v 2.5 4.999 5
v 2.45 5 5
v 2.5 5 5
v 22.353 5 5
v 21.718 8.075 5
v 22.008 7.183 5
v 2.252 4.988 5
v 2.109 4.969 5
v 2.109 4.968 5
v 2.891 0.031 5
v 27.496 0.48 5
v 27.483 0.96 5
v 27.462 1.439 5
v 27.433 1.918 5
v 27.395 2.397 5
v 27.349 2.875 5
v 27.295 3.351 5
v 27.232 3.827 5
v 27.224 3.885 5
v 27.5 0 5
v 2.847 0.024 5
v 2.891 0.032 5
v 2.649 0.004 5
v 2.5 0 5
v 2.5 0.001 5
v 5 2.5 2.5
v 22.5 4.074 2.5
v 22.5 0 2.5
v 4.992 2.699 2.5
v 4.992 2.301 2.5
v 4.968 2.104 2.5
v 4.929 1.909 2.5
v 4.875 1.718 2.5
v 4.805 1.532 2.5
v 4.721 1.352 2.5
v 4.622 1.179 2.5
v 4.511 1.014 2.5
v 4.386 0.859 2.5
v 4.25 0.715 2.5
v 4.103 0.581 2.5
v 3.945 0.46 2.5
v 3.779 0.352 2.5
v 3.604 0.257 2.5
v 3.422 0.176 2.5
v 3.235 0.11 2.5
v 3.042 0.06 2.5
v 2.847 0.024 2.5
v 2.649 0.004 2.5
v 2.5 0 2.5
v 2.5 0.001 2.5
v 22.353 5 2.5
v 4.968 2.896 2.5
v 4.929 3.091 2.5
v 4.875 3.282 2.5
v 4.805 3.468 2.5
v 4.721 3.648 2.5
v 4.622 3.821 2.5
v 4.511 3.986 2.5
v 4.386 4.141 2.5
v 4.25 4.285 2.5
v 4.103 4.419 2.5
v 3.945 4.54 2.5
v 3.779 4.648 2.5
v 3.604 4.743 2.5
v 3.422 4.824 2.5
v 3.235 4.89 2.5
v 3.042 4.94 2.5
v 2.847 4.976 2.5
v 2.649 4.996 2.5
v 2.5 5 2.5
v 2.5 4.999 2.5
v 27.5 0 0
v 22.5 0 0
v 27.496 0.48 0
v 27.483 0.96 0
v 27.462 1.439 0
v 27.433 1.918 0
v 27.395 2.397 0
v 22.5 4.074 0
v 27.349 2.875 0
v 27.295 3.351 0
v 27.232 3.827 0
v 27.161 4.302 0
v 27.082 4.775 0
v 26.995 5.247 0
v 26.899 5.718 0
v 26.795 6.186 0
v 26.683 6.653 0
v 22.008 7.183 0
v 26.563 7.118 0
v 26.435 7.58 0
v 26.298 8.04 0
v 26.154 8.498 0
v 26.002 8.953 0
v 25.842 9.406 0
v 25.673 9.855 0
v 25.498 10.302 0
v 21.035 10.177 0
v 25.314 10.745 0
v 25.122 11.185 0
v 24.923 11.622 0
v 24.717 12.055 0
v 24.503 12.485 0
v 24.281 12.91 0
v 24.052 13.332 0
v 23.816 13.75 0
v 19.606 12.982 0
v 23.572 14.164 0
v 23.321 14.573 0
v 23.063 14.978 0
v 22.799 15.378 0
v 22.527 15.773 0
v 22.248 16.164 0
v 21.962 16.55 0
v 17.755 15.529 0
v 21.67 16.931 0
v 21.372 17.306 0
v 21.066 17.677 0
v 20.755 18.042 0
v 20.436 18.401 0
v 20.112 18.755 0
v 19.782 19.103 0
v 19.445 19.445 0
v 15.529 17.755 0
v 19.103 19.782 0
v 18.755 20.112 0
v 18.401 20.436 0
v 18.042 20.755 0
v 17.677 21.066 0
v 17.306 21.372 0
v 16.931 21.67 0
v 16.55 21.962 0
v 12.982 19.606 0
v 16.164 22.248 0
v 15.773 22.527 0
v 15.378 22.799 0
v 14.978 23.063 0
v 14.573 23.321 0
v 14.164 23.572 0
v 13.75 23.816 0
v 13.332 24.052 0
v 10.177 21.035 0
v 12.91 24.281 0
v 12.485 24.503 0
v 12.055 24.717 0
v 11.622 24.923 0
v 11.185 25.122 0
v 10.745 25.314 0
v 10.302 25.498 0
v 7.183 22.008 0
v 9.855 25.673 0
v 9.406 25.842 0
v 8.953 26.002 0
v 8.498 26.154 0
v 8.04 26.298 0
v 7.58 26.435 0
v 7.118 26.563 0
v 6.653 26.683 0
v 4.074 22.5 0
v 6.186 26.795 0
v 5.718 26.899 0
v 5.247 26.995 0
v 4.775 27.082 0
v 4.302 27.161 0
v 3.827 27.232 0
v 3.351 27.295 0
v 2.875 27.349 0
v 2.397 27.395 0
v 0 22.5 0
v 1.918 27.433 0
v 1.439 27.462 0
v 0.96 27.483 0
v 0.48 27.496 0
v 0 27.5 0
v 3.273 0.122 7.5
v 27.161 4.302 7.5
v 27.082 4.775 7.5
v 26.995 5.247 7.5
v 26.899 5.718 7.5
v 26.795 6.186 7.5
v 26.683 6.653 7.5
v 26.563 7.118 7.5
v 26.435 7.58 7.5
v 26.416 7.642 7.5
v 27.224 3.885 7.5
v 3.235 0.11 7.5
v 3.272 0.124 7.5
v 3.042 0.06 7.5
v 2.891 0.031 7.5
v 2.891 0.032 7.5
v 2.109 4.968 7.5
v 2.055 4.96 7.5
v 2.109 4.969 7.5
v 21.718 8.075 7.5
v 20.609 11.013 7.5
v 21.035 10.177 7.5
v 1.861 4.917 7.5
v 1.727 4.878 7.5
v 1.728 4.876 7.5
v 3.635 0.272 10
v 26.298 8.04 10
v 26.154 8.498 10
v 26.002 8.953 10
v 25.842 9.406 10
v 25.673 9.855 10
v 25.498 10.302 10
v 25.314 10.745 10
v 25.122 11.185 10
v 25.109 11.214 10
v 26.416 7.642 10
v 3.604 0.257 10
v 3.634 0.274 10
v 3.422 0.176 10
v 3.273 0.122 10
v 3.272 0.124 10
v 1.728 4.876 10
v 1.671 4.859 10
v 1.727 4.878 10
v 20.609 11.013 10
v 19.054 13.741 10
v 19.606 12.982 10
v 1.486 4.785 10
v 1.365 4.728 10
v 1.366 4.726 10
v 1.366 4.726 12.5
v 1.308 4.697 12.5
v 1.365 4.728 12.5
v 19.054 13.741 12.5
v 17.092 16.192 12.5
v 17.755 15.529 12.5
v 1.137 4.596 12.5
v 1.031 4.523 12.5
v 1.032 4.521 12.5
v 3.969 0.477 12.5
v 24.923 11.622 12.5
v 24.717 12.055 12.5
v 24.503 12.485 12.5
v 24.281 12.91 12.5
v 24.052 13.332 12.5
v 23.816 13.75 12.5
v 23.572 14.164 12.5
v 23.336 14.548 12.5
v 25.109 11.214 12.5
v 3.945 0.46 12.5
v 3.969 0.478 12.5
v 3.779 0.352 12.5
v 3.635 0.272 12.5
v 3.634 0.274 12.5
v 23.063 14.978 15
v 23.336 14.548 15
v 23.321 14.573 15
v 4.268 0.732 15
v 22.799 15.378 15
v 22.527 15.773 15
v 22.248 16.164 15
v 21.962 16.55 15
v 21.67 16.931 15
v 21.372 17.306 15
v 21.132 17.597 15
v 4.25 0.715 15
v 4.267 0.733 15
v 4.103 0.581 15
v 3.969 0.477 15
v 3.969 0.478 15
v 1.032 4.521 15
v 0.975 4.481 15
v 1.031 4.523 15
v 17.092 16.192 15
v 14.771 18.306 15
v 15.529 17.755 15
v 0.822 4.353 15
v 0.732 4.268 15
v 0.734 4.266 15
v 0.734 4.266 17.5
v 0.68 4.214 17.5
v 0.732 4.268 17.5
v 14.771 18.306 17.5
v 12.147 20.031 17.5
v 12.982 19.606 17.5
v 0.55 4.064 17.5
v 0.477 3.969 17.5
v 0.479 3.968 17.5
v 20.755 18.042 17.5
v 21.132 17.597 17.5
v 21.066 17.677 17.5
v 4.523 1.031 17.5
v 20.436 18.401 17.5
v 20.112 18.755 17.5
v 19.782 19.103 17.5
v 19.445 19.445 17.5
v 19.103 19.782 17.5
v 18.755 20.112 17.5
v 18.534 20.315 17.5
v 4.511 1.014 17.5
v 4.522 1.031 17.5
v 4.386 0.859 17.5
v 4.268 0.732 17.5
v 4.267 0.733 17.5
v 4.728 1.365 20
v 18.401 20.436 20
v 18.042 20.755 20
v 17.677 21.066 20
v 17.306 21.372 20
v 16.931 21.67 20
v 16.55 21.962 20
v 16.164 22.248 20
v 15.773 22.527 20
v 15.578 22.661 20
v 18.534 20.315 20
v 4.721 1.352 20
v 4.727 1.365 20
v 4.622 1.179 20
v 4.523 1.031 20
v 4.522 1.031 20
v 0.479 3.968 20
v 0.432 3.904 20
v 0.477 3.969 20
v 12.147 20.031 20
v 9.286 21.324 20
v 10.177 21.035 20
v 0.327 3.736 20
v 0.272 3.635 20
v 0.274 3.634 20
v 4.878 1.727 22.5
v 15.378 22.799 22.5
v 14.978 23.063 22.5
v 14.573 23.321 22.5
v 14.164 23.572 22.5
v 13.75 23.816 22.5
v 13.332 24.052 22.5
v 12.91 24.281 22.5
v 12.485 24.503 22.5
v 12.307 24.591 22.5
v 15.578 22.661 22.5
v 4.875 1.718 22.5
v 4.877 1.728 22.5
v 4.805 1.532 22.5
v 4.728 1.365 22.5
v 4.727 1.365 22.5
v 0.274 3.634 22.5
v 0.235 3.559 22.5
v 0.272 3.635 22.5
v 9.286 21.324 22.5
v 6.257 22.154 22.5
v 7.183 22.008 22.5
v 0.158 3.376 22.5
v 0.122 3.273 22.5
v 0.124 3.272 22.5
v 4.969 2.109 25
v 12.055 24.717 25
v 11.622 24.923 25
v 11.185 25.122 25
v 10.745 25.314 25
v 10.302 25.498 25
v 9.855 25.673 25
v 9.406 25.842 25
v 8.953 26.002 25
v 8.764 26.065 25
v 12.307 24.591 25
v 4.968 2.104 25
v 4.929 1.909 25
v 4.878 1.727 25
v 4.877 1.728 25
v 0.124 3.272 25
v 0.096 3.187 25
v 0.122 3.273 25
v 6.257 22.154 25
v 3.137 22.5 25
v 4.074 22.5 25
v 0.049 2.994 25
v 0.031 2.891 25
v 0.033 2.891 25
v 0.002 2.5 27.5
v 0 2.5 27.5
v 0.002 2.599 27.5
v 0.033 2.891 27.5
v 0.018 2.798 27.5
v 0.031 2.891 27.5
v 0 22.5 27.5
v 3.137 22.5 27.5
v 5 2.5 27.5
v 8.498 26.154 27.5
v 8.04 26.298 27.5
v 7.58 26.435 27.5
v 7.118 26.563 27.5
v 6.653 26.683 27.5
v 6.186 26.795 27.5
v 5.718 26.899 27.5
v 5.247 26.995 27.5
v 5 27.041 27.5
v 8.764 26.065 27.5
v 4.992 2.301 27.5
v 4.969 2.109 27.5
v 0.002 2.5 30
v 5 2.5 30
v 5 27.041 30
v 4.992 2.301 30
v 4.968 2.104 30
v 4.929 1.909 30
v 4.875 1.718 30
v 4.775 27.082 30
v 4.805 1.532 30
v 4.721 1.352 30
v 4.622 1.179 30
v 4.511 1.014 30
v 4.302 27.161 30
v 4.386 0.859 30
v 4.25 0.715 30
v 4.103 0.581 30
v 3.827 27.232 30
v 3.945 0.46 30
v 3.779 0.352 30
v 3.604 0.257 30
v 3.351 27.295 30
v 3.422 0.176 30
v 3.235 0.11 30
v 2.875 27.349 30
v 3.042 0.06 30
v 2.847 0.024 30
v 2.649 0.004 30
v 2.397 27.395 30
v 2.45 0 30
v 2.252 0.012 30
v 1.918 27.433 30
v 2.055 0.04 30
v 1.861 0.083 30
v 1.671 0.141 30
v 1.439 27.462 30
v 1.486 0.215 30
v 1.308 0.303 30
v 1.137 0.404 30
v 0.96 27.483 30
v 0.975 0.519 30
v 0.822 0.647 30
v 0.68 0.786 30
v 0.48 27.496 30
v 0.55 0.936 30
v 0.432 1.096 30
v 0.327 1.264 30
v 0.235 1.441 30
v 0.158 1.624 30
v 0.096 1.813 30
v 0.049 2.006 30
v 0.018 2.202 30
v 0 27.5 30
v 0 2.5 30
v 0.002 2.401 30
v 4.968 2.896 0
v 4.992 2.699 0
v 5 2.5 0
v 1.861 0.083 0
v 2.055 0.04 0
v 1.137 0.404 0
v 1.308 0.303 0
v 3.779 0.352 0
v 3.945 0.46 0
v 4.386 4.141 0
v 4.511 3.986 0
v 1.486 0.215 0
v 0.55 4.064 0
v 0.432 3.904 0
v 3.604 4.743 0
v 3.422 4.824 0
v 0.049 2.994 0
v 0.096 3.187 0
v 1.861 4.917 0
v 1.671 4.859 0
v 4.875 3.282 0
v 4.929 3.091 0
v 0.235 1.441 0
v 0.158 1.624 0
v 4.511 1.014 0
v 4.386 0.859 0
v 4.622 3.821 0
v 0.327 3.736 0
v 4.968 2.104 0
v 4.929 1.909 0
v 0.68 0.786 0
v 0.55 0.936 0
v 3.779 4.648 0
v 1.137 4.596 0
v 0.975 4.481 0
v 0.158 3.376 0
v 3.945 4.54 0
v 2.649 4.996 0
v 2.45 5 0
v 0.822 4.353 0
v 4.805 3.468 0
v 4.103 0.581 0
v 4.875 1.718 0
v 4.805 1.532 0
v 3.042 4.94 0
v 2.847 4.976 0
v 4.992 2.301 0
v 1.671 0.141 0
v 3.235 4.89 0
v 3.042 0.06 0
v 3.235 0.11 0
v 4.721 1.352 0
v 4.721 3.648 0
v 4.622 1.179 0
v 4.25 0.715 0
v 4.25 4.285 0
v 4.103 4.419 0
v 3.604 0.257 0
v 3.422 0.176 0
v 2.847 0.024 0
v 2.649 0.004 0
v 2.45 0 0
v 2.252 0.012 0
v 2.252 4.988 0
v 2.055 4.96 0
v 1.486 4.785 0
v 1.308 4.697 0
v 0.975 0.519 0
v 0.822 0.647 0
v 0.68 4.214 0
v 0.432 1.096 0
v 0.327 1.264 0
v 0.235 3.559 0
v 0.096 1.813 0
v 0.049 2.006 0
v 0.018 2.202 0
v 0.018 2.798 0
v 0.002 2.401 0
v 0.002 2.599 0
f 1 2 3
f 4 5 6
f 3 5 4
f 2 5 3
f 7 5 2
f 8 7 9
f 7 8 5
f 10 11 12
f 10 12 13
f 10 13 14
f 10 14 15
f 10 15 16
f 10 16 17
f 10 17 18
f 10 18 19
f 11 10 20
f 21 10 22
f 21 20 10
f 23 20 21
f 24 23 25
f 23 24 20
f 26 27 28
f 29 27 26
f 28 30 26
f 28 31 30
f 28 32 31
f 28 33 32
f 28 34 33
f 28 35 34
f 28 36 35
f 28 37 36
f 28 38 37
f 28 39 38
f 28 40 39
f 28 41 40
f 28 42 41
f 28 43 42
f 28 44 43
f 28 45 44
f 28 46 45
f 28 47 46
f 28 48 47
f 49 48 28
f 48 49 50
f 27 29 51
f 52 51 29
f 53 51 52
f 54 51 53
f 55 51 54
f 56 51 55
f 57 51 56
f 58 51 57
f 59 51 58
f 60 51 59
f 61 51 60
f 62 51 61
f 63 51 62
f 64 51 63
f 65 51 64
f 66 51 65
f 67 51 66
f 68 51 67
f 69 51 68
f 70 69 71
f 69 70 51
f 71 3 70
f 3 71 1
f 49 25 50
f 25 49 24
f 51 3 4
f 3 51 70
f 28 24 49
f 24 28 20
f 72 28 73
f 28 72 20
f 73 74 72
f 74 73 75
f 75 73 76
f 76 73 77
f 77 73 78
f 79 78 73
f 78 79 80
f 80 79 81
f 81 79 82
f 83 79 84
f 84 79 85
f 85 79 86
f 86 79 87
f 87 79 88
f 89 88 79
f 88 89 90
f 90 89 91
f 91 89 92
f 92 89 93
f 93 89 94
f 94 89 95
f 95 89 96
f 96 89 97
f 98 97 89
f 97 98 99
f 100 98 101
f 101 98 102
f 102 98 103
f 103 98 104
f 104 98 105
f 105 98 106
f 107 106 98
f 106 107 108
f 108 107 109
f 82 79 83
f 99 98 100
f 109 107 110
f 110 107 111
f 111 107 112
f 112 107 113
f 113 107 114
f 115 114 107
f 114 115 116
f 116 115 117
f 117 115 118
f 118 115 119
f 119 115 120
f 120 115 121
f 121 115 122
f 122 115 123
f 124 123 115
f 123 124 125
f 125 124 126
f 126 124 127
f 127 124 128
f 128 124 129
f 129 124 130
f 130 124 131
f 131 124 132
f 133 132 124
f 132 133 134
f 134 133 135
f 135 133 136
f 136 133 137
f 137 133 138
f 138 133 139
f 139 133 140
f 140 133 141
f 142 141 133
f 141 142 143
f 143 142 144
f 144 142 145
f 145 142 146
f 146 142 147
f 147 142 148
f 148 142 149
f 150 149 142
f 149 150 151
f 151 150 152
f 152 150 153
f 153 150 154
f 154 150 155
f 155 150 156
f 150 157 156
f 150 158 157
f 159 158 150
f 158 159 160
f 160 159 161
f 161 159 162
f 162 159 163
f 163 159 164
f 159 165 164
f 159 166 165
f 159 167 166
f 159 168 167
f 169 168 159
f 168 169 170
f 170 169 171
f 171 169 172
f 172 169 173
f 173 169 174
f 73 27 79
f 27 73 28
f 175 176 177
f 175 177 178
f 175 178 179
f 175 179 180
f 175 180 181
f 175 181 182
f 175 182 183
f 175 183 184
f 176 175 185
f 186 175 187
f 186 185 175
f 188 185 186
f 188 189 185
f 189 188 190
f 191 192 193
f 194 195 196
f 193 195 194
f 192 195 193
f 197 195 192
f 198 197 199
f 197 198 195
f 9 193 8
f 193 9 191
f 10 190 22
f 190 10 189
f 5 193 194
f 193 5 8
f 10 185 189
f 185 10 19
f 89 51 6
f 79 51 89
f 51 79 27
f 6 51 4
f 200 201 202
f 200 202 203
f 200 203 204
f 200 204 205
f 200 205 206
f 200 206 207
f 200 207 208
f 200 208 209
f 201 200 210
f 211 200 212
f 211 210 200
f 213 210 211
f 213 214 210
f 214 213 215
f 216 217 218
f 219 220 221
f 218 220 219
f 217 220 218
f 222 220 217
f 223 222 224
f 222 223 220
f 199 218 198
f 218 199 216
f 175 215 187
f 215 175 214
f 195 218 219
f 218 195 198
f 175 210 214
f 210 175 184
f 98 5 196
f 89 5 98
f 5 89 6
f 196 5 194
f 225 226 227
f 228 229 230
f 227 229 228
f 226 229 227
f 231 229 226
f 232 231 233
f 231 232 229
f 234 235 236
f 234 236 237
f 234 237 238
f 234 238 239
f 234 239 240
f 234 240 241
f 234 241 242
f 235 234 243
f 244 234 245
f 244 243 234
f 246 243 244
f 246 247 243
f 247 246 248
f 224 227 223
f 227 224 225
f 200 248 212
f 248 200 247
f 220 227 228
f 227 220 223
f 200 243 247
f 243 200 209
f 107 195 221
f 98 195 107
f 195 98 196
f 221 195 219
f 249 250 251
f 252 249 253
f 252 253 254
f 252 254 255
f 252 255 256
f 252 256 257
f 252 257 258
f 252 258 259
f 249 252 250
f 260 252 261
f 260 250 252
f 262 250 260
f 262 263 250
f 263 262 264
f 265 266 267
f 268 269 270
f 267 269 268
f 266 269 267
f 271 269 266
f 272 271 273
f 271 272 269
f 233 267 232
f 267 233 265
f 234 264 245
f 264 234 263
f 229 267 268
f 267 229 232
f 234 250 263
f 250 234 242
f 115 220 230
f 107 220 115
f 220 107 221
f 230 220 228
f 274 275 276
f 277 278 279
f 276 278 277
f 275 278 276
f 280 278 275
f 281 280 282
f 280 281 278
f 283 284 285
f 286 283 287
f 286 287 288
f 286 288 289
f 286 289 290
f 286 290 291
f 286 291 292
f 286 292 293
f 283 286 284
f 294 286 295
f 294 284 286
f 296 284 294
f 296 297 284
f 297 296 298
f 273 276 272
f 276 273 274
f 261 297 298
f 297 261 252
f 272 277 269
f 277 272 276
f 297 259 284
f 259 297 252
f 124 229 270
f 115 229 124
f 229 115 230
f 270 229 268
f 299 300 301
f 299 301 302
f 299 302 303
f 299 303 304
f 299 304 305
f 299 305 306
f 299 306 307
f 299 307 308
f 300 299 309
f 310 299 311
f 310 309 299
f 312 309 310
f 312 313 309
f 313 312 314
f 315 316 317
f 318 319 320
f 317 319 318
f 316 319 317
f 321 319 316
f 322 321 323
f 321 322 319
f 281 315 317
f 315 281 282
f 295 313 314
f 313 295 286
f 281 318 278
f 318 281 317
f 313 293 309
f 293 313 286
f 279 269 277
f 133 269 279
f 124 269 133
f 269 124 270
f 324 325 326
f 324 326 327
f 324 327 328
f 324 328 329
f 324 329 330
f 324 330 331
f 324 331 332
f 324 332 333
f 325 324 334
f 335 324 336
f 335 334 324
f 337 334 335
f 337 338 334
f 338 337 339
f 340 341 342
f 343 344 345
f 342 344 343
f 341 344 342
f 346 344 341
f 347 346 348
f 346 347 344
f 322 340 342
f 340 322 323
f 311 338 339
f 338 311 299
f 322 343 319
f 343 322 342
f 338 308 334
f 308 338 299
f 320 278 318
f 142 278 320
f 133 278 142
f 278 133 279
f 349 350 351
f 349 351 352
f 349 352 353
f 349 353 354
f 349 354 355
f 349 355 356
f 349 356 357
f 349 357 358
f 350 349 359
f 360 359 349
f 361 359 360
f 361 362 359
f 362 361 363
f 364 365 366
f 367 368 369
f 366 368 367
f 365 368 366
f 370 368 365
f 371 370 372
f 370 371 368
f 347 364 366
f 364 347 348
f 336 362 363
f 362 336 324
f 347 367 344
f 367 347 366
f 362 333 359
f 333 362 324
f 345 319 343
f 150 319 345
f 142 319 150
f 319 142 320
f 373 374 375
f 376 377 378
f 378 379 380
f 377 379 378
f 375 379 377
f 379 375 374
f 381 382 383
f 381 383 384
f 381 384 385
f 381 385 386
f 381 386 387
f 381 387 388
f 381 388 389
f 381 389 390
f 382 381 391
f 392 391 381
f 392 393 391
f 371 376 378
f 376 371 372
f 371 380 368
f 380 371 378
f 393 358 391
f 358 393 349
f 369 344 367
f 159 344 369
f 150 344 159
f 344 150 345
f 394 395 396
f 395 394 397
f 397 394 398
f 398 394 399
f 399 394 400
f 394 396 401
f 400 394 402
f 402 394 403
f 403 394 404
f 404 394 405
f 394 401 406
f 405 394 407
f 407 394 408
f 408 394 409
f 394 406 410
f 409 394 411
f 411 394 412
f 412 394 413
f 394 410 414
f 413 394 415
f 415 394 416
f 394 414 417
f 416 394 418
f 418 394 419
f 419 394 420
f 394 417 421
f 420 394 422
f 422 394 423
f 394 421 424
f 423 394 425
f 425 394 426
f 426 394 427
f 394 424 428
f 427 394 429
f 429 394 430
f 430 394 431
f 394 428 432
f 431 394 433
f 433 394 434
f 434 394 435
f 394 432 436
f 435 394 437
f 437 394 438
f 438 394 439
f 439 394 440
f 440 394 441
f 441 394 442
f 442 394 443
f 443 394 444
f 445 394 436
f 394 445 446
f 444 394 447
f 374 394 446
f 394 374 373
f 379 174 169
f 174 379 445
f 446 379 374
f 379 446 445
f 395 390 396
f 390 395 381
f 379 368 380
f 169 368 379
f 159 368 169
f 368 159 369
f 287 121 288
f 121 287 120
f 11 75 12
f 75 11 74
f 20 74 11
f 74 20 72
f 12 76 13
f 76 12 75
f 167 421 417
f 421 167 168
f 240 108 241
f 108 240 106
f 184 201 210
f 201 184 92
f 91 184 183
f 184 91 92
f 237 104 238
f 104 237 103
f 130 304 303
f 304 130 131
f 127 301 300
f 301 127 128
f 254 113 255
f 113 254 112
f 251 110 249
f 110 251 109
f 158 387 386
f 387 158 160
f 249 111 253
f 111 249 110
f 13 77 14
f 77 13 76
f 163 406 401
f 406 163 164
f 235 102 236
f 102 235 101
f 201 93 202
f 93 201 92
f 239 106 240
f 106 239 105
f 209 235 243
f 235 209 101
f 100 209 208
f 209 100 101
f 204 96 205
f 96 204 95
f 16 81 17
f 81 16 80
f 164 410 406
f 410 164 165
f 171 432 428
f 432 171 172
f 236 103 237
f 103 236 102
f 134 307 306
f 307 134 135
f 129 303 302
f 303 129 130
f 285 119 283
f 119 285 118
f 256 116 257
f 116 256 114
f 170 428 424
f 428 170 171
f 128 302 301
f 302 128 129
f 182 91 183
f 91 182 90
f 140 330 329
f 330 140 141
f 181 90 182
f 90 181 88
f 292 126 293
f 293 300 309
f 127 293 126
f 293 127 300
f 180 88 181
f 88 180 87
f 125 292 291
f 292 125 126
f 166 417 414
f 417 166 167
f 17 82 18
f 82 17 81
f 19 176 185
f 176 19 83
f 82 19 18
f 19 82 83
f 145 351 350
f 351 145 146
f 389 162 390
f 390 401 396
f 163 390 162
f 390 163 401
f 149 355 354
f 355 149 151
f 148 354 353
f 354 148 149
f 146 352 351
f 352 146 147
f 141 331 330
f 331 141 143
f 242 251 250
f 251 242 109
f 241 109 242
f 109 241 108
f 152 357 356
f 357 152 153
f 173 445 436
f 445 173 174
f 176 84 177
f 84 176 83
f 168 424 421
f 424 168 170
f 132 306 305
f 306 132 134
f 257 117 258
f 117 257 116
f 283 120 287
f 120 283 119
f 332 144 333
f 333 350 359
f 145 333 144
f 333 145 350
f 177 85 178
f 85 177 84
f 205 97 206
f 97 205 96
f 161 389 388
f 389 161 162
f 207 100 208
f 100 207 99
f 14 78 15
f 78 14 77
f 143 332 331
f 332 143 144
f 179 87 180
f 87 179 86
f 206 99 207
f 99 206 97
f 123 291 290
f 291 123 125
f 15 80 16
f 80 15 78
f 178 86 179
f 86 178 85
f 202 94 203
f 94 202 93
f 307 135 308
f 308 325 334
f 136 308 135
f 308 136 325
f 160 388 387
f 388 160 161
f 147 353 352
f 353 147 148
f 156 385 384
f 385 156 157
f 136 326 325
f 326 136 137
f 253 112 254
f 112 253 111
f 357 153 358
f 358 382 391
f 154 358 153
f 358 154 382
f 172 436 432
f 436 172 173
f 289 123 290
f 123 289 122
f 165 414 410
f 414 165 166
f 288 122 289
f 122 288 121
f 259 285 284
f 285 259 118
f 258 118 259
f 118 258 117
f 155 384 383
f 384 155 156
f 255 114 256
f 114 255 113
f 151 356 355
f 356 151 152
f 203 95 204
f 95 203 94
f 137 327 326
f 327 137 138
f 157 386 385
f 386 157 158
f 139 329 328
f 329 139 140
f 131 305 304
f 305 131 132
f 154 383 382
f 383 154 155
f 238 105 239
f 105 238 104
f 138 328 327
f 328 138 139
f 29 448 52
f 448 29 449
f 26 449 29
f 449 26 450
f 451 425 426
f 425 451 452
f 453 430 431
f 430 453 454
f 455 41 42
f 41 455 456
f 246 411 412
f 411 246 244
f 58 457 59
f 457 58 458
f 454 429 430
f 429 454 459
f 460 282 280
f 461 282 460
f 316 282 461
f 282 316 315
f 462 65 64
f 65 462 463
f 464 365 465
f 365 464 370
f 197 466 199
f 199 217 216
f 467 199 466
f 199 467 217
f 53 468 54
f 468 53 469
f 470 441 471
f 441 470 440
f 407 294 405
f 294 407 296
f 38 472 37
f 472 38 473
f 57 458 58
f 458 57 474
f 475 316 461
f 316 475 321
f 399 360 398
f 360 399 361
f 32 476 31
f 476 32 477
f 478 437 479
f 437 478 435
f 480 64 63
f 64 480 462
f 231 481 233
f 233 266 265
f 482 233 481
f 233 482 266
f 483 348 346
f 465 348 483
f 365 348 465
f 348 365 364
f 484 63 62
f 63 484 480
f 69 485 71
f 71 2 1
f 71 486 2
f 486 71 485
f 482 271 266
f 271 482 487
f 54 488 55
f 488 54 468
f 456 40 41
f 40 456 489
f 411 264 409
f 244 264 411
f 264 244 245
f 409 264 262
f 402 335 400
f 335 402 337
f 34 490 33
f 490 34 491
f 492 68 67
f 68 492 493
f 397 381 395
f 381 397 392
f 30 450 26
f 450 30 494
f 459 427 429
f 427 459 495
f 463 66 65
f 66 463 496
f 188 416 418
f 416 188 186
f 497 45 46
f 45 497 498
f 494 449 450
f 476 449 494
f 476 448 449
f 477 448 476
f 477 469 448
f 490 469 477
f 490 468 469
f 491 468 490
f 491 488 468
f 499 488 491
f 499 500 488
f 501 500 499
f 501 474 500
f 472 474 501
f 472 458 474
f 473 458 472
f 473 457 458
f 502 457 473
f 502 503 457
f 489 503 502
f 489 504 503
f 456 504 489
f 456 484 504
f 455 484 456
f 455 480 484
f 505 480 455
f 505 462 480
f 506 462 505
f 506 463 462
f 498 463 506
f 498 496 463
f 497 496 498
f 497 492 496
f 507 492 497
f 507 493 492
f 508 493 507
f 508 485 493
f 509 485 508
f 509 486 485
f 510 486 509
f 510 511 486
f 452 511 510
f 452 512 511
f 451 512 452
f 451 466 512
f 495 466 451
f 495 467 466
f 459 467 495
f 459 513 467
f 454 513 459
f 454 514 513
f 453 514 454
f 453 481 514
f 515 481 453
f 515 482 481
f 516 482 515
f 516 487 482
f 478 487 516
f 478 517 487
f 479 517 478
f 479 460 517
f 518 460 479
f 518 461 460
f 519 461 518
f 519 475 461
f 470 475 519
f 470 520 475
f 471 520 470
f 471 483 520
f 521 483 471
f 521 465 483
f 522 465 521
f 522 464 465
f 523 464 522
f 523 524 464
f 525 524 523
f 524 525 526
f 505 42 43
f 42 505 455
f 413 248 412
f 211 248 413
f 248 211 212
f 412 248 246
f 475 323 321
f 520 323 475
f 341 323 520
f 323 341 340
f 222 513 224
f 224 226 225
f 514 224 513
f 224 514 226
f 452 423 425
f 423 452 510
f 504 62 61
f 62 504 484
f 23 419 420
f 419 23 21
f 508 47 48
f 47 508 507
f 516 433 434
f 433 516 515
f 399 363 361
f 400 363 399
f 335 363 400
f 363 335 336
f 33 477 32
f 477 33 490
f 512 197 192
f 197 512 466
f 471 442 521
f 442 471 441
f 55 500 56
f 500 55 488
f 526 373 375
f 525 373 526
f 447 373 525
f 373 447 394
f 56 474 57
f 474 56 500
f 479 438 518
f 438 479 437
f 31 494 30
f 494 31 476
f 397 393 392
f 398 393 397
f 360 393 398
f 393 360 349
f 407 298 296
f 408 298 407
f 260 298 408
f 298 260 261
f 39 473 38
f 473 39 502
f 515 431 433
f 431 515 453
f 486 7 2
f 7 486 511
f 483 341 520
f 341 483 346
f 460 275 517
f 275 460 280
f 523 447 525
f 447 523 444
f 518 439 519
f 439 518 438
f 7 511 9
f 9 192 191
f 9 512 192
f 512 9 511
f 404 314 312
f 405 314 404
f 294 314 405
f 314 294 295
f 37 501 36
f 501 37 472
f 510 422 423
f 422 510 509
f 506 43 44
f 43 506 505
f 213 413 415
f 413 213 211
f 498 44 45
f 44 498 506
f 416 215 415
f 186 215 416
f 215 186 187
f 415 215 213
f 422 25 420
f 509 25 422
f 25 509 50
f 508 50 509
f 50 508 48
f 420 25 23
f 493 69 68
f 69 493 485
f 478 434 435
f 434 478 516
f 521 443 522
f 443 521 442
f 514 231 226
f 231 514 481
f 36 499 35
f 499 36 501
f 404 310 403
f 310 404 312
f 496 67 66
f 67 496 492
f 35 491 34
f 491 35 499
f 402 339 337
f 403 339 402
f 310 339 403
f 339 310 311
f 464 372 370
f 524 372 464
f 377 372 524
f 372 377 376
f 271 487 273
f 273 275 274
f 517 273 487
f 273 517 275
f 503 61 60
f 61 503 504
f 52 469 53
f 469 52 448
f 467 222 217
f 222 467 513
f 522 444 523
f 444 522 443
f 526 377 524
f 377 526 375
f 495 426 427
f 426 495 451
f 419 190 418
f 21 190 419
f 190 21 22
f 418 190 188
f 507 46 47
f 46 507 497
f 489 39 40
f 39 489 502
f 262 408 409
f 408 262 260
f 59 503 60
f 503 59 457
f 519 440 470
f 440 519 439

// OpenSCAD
thickness = 5;
steps = 10;
height = 30;
width = 20;
$fs = 0.2;
$fa = 1;

translate([thickness / 2, thickness / 2, 0]) {
	cylinder(r=thickness / 2, h=height);
}

intersection() {
	union() {
		translate([thickness / 2, thickness / 2, 0]) {
			for(step = [0:steps]) {
				rotate([0, 0, 90 / steps * step]) {
					translate([0, -thickness / 2, height / (steps + 2) * (step + 1)]) {
						cube([width + thickness, thickness, height / (steps + 2)]);
					}
					translate([width, -thickness / 2, 0]) {
						cube([thickness, thickness, height / (steps + 2) * (step + 2)]);
					}
				}
			}
		}
	}
	cylinder(r=width + thickness * 1.5, h=height);
}
